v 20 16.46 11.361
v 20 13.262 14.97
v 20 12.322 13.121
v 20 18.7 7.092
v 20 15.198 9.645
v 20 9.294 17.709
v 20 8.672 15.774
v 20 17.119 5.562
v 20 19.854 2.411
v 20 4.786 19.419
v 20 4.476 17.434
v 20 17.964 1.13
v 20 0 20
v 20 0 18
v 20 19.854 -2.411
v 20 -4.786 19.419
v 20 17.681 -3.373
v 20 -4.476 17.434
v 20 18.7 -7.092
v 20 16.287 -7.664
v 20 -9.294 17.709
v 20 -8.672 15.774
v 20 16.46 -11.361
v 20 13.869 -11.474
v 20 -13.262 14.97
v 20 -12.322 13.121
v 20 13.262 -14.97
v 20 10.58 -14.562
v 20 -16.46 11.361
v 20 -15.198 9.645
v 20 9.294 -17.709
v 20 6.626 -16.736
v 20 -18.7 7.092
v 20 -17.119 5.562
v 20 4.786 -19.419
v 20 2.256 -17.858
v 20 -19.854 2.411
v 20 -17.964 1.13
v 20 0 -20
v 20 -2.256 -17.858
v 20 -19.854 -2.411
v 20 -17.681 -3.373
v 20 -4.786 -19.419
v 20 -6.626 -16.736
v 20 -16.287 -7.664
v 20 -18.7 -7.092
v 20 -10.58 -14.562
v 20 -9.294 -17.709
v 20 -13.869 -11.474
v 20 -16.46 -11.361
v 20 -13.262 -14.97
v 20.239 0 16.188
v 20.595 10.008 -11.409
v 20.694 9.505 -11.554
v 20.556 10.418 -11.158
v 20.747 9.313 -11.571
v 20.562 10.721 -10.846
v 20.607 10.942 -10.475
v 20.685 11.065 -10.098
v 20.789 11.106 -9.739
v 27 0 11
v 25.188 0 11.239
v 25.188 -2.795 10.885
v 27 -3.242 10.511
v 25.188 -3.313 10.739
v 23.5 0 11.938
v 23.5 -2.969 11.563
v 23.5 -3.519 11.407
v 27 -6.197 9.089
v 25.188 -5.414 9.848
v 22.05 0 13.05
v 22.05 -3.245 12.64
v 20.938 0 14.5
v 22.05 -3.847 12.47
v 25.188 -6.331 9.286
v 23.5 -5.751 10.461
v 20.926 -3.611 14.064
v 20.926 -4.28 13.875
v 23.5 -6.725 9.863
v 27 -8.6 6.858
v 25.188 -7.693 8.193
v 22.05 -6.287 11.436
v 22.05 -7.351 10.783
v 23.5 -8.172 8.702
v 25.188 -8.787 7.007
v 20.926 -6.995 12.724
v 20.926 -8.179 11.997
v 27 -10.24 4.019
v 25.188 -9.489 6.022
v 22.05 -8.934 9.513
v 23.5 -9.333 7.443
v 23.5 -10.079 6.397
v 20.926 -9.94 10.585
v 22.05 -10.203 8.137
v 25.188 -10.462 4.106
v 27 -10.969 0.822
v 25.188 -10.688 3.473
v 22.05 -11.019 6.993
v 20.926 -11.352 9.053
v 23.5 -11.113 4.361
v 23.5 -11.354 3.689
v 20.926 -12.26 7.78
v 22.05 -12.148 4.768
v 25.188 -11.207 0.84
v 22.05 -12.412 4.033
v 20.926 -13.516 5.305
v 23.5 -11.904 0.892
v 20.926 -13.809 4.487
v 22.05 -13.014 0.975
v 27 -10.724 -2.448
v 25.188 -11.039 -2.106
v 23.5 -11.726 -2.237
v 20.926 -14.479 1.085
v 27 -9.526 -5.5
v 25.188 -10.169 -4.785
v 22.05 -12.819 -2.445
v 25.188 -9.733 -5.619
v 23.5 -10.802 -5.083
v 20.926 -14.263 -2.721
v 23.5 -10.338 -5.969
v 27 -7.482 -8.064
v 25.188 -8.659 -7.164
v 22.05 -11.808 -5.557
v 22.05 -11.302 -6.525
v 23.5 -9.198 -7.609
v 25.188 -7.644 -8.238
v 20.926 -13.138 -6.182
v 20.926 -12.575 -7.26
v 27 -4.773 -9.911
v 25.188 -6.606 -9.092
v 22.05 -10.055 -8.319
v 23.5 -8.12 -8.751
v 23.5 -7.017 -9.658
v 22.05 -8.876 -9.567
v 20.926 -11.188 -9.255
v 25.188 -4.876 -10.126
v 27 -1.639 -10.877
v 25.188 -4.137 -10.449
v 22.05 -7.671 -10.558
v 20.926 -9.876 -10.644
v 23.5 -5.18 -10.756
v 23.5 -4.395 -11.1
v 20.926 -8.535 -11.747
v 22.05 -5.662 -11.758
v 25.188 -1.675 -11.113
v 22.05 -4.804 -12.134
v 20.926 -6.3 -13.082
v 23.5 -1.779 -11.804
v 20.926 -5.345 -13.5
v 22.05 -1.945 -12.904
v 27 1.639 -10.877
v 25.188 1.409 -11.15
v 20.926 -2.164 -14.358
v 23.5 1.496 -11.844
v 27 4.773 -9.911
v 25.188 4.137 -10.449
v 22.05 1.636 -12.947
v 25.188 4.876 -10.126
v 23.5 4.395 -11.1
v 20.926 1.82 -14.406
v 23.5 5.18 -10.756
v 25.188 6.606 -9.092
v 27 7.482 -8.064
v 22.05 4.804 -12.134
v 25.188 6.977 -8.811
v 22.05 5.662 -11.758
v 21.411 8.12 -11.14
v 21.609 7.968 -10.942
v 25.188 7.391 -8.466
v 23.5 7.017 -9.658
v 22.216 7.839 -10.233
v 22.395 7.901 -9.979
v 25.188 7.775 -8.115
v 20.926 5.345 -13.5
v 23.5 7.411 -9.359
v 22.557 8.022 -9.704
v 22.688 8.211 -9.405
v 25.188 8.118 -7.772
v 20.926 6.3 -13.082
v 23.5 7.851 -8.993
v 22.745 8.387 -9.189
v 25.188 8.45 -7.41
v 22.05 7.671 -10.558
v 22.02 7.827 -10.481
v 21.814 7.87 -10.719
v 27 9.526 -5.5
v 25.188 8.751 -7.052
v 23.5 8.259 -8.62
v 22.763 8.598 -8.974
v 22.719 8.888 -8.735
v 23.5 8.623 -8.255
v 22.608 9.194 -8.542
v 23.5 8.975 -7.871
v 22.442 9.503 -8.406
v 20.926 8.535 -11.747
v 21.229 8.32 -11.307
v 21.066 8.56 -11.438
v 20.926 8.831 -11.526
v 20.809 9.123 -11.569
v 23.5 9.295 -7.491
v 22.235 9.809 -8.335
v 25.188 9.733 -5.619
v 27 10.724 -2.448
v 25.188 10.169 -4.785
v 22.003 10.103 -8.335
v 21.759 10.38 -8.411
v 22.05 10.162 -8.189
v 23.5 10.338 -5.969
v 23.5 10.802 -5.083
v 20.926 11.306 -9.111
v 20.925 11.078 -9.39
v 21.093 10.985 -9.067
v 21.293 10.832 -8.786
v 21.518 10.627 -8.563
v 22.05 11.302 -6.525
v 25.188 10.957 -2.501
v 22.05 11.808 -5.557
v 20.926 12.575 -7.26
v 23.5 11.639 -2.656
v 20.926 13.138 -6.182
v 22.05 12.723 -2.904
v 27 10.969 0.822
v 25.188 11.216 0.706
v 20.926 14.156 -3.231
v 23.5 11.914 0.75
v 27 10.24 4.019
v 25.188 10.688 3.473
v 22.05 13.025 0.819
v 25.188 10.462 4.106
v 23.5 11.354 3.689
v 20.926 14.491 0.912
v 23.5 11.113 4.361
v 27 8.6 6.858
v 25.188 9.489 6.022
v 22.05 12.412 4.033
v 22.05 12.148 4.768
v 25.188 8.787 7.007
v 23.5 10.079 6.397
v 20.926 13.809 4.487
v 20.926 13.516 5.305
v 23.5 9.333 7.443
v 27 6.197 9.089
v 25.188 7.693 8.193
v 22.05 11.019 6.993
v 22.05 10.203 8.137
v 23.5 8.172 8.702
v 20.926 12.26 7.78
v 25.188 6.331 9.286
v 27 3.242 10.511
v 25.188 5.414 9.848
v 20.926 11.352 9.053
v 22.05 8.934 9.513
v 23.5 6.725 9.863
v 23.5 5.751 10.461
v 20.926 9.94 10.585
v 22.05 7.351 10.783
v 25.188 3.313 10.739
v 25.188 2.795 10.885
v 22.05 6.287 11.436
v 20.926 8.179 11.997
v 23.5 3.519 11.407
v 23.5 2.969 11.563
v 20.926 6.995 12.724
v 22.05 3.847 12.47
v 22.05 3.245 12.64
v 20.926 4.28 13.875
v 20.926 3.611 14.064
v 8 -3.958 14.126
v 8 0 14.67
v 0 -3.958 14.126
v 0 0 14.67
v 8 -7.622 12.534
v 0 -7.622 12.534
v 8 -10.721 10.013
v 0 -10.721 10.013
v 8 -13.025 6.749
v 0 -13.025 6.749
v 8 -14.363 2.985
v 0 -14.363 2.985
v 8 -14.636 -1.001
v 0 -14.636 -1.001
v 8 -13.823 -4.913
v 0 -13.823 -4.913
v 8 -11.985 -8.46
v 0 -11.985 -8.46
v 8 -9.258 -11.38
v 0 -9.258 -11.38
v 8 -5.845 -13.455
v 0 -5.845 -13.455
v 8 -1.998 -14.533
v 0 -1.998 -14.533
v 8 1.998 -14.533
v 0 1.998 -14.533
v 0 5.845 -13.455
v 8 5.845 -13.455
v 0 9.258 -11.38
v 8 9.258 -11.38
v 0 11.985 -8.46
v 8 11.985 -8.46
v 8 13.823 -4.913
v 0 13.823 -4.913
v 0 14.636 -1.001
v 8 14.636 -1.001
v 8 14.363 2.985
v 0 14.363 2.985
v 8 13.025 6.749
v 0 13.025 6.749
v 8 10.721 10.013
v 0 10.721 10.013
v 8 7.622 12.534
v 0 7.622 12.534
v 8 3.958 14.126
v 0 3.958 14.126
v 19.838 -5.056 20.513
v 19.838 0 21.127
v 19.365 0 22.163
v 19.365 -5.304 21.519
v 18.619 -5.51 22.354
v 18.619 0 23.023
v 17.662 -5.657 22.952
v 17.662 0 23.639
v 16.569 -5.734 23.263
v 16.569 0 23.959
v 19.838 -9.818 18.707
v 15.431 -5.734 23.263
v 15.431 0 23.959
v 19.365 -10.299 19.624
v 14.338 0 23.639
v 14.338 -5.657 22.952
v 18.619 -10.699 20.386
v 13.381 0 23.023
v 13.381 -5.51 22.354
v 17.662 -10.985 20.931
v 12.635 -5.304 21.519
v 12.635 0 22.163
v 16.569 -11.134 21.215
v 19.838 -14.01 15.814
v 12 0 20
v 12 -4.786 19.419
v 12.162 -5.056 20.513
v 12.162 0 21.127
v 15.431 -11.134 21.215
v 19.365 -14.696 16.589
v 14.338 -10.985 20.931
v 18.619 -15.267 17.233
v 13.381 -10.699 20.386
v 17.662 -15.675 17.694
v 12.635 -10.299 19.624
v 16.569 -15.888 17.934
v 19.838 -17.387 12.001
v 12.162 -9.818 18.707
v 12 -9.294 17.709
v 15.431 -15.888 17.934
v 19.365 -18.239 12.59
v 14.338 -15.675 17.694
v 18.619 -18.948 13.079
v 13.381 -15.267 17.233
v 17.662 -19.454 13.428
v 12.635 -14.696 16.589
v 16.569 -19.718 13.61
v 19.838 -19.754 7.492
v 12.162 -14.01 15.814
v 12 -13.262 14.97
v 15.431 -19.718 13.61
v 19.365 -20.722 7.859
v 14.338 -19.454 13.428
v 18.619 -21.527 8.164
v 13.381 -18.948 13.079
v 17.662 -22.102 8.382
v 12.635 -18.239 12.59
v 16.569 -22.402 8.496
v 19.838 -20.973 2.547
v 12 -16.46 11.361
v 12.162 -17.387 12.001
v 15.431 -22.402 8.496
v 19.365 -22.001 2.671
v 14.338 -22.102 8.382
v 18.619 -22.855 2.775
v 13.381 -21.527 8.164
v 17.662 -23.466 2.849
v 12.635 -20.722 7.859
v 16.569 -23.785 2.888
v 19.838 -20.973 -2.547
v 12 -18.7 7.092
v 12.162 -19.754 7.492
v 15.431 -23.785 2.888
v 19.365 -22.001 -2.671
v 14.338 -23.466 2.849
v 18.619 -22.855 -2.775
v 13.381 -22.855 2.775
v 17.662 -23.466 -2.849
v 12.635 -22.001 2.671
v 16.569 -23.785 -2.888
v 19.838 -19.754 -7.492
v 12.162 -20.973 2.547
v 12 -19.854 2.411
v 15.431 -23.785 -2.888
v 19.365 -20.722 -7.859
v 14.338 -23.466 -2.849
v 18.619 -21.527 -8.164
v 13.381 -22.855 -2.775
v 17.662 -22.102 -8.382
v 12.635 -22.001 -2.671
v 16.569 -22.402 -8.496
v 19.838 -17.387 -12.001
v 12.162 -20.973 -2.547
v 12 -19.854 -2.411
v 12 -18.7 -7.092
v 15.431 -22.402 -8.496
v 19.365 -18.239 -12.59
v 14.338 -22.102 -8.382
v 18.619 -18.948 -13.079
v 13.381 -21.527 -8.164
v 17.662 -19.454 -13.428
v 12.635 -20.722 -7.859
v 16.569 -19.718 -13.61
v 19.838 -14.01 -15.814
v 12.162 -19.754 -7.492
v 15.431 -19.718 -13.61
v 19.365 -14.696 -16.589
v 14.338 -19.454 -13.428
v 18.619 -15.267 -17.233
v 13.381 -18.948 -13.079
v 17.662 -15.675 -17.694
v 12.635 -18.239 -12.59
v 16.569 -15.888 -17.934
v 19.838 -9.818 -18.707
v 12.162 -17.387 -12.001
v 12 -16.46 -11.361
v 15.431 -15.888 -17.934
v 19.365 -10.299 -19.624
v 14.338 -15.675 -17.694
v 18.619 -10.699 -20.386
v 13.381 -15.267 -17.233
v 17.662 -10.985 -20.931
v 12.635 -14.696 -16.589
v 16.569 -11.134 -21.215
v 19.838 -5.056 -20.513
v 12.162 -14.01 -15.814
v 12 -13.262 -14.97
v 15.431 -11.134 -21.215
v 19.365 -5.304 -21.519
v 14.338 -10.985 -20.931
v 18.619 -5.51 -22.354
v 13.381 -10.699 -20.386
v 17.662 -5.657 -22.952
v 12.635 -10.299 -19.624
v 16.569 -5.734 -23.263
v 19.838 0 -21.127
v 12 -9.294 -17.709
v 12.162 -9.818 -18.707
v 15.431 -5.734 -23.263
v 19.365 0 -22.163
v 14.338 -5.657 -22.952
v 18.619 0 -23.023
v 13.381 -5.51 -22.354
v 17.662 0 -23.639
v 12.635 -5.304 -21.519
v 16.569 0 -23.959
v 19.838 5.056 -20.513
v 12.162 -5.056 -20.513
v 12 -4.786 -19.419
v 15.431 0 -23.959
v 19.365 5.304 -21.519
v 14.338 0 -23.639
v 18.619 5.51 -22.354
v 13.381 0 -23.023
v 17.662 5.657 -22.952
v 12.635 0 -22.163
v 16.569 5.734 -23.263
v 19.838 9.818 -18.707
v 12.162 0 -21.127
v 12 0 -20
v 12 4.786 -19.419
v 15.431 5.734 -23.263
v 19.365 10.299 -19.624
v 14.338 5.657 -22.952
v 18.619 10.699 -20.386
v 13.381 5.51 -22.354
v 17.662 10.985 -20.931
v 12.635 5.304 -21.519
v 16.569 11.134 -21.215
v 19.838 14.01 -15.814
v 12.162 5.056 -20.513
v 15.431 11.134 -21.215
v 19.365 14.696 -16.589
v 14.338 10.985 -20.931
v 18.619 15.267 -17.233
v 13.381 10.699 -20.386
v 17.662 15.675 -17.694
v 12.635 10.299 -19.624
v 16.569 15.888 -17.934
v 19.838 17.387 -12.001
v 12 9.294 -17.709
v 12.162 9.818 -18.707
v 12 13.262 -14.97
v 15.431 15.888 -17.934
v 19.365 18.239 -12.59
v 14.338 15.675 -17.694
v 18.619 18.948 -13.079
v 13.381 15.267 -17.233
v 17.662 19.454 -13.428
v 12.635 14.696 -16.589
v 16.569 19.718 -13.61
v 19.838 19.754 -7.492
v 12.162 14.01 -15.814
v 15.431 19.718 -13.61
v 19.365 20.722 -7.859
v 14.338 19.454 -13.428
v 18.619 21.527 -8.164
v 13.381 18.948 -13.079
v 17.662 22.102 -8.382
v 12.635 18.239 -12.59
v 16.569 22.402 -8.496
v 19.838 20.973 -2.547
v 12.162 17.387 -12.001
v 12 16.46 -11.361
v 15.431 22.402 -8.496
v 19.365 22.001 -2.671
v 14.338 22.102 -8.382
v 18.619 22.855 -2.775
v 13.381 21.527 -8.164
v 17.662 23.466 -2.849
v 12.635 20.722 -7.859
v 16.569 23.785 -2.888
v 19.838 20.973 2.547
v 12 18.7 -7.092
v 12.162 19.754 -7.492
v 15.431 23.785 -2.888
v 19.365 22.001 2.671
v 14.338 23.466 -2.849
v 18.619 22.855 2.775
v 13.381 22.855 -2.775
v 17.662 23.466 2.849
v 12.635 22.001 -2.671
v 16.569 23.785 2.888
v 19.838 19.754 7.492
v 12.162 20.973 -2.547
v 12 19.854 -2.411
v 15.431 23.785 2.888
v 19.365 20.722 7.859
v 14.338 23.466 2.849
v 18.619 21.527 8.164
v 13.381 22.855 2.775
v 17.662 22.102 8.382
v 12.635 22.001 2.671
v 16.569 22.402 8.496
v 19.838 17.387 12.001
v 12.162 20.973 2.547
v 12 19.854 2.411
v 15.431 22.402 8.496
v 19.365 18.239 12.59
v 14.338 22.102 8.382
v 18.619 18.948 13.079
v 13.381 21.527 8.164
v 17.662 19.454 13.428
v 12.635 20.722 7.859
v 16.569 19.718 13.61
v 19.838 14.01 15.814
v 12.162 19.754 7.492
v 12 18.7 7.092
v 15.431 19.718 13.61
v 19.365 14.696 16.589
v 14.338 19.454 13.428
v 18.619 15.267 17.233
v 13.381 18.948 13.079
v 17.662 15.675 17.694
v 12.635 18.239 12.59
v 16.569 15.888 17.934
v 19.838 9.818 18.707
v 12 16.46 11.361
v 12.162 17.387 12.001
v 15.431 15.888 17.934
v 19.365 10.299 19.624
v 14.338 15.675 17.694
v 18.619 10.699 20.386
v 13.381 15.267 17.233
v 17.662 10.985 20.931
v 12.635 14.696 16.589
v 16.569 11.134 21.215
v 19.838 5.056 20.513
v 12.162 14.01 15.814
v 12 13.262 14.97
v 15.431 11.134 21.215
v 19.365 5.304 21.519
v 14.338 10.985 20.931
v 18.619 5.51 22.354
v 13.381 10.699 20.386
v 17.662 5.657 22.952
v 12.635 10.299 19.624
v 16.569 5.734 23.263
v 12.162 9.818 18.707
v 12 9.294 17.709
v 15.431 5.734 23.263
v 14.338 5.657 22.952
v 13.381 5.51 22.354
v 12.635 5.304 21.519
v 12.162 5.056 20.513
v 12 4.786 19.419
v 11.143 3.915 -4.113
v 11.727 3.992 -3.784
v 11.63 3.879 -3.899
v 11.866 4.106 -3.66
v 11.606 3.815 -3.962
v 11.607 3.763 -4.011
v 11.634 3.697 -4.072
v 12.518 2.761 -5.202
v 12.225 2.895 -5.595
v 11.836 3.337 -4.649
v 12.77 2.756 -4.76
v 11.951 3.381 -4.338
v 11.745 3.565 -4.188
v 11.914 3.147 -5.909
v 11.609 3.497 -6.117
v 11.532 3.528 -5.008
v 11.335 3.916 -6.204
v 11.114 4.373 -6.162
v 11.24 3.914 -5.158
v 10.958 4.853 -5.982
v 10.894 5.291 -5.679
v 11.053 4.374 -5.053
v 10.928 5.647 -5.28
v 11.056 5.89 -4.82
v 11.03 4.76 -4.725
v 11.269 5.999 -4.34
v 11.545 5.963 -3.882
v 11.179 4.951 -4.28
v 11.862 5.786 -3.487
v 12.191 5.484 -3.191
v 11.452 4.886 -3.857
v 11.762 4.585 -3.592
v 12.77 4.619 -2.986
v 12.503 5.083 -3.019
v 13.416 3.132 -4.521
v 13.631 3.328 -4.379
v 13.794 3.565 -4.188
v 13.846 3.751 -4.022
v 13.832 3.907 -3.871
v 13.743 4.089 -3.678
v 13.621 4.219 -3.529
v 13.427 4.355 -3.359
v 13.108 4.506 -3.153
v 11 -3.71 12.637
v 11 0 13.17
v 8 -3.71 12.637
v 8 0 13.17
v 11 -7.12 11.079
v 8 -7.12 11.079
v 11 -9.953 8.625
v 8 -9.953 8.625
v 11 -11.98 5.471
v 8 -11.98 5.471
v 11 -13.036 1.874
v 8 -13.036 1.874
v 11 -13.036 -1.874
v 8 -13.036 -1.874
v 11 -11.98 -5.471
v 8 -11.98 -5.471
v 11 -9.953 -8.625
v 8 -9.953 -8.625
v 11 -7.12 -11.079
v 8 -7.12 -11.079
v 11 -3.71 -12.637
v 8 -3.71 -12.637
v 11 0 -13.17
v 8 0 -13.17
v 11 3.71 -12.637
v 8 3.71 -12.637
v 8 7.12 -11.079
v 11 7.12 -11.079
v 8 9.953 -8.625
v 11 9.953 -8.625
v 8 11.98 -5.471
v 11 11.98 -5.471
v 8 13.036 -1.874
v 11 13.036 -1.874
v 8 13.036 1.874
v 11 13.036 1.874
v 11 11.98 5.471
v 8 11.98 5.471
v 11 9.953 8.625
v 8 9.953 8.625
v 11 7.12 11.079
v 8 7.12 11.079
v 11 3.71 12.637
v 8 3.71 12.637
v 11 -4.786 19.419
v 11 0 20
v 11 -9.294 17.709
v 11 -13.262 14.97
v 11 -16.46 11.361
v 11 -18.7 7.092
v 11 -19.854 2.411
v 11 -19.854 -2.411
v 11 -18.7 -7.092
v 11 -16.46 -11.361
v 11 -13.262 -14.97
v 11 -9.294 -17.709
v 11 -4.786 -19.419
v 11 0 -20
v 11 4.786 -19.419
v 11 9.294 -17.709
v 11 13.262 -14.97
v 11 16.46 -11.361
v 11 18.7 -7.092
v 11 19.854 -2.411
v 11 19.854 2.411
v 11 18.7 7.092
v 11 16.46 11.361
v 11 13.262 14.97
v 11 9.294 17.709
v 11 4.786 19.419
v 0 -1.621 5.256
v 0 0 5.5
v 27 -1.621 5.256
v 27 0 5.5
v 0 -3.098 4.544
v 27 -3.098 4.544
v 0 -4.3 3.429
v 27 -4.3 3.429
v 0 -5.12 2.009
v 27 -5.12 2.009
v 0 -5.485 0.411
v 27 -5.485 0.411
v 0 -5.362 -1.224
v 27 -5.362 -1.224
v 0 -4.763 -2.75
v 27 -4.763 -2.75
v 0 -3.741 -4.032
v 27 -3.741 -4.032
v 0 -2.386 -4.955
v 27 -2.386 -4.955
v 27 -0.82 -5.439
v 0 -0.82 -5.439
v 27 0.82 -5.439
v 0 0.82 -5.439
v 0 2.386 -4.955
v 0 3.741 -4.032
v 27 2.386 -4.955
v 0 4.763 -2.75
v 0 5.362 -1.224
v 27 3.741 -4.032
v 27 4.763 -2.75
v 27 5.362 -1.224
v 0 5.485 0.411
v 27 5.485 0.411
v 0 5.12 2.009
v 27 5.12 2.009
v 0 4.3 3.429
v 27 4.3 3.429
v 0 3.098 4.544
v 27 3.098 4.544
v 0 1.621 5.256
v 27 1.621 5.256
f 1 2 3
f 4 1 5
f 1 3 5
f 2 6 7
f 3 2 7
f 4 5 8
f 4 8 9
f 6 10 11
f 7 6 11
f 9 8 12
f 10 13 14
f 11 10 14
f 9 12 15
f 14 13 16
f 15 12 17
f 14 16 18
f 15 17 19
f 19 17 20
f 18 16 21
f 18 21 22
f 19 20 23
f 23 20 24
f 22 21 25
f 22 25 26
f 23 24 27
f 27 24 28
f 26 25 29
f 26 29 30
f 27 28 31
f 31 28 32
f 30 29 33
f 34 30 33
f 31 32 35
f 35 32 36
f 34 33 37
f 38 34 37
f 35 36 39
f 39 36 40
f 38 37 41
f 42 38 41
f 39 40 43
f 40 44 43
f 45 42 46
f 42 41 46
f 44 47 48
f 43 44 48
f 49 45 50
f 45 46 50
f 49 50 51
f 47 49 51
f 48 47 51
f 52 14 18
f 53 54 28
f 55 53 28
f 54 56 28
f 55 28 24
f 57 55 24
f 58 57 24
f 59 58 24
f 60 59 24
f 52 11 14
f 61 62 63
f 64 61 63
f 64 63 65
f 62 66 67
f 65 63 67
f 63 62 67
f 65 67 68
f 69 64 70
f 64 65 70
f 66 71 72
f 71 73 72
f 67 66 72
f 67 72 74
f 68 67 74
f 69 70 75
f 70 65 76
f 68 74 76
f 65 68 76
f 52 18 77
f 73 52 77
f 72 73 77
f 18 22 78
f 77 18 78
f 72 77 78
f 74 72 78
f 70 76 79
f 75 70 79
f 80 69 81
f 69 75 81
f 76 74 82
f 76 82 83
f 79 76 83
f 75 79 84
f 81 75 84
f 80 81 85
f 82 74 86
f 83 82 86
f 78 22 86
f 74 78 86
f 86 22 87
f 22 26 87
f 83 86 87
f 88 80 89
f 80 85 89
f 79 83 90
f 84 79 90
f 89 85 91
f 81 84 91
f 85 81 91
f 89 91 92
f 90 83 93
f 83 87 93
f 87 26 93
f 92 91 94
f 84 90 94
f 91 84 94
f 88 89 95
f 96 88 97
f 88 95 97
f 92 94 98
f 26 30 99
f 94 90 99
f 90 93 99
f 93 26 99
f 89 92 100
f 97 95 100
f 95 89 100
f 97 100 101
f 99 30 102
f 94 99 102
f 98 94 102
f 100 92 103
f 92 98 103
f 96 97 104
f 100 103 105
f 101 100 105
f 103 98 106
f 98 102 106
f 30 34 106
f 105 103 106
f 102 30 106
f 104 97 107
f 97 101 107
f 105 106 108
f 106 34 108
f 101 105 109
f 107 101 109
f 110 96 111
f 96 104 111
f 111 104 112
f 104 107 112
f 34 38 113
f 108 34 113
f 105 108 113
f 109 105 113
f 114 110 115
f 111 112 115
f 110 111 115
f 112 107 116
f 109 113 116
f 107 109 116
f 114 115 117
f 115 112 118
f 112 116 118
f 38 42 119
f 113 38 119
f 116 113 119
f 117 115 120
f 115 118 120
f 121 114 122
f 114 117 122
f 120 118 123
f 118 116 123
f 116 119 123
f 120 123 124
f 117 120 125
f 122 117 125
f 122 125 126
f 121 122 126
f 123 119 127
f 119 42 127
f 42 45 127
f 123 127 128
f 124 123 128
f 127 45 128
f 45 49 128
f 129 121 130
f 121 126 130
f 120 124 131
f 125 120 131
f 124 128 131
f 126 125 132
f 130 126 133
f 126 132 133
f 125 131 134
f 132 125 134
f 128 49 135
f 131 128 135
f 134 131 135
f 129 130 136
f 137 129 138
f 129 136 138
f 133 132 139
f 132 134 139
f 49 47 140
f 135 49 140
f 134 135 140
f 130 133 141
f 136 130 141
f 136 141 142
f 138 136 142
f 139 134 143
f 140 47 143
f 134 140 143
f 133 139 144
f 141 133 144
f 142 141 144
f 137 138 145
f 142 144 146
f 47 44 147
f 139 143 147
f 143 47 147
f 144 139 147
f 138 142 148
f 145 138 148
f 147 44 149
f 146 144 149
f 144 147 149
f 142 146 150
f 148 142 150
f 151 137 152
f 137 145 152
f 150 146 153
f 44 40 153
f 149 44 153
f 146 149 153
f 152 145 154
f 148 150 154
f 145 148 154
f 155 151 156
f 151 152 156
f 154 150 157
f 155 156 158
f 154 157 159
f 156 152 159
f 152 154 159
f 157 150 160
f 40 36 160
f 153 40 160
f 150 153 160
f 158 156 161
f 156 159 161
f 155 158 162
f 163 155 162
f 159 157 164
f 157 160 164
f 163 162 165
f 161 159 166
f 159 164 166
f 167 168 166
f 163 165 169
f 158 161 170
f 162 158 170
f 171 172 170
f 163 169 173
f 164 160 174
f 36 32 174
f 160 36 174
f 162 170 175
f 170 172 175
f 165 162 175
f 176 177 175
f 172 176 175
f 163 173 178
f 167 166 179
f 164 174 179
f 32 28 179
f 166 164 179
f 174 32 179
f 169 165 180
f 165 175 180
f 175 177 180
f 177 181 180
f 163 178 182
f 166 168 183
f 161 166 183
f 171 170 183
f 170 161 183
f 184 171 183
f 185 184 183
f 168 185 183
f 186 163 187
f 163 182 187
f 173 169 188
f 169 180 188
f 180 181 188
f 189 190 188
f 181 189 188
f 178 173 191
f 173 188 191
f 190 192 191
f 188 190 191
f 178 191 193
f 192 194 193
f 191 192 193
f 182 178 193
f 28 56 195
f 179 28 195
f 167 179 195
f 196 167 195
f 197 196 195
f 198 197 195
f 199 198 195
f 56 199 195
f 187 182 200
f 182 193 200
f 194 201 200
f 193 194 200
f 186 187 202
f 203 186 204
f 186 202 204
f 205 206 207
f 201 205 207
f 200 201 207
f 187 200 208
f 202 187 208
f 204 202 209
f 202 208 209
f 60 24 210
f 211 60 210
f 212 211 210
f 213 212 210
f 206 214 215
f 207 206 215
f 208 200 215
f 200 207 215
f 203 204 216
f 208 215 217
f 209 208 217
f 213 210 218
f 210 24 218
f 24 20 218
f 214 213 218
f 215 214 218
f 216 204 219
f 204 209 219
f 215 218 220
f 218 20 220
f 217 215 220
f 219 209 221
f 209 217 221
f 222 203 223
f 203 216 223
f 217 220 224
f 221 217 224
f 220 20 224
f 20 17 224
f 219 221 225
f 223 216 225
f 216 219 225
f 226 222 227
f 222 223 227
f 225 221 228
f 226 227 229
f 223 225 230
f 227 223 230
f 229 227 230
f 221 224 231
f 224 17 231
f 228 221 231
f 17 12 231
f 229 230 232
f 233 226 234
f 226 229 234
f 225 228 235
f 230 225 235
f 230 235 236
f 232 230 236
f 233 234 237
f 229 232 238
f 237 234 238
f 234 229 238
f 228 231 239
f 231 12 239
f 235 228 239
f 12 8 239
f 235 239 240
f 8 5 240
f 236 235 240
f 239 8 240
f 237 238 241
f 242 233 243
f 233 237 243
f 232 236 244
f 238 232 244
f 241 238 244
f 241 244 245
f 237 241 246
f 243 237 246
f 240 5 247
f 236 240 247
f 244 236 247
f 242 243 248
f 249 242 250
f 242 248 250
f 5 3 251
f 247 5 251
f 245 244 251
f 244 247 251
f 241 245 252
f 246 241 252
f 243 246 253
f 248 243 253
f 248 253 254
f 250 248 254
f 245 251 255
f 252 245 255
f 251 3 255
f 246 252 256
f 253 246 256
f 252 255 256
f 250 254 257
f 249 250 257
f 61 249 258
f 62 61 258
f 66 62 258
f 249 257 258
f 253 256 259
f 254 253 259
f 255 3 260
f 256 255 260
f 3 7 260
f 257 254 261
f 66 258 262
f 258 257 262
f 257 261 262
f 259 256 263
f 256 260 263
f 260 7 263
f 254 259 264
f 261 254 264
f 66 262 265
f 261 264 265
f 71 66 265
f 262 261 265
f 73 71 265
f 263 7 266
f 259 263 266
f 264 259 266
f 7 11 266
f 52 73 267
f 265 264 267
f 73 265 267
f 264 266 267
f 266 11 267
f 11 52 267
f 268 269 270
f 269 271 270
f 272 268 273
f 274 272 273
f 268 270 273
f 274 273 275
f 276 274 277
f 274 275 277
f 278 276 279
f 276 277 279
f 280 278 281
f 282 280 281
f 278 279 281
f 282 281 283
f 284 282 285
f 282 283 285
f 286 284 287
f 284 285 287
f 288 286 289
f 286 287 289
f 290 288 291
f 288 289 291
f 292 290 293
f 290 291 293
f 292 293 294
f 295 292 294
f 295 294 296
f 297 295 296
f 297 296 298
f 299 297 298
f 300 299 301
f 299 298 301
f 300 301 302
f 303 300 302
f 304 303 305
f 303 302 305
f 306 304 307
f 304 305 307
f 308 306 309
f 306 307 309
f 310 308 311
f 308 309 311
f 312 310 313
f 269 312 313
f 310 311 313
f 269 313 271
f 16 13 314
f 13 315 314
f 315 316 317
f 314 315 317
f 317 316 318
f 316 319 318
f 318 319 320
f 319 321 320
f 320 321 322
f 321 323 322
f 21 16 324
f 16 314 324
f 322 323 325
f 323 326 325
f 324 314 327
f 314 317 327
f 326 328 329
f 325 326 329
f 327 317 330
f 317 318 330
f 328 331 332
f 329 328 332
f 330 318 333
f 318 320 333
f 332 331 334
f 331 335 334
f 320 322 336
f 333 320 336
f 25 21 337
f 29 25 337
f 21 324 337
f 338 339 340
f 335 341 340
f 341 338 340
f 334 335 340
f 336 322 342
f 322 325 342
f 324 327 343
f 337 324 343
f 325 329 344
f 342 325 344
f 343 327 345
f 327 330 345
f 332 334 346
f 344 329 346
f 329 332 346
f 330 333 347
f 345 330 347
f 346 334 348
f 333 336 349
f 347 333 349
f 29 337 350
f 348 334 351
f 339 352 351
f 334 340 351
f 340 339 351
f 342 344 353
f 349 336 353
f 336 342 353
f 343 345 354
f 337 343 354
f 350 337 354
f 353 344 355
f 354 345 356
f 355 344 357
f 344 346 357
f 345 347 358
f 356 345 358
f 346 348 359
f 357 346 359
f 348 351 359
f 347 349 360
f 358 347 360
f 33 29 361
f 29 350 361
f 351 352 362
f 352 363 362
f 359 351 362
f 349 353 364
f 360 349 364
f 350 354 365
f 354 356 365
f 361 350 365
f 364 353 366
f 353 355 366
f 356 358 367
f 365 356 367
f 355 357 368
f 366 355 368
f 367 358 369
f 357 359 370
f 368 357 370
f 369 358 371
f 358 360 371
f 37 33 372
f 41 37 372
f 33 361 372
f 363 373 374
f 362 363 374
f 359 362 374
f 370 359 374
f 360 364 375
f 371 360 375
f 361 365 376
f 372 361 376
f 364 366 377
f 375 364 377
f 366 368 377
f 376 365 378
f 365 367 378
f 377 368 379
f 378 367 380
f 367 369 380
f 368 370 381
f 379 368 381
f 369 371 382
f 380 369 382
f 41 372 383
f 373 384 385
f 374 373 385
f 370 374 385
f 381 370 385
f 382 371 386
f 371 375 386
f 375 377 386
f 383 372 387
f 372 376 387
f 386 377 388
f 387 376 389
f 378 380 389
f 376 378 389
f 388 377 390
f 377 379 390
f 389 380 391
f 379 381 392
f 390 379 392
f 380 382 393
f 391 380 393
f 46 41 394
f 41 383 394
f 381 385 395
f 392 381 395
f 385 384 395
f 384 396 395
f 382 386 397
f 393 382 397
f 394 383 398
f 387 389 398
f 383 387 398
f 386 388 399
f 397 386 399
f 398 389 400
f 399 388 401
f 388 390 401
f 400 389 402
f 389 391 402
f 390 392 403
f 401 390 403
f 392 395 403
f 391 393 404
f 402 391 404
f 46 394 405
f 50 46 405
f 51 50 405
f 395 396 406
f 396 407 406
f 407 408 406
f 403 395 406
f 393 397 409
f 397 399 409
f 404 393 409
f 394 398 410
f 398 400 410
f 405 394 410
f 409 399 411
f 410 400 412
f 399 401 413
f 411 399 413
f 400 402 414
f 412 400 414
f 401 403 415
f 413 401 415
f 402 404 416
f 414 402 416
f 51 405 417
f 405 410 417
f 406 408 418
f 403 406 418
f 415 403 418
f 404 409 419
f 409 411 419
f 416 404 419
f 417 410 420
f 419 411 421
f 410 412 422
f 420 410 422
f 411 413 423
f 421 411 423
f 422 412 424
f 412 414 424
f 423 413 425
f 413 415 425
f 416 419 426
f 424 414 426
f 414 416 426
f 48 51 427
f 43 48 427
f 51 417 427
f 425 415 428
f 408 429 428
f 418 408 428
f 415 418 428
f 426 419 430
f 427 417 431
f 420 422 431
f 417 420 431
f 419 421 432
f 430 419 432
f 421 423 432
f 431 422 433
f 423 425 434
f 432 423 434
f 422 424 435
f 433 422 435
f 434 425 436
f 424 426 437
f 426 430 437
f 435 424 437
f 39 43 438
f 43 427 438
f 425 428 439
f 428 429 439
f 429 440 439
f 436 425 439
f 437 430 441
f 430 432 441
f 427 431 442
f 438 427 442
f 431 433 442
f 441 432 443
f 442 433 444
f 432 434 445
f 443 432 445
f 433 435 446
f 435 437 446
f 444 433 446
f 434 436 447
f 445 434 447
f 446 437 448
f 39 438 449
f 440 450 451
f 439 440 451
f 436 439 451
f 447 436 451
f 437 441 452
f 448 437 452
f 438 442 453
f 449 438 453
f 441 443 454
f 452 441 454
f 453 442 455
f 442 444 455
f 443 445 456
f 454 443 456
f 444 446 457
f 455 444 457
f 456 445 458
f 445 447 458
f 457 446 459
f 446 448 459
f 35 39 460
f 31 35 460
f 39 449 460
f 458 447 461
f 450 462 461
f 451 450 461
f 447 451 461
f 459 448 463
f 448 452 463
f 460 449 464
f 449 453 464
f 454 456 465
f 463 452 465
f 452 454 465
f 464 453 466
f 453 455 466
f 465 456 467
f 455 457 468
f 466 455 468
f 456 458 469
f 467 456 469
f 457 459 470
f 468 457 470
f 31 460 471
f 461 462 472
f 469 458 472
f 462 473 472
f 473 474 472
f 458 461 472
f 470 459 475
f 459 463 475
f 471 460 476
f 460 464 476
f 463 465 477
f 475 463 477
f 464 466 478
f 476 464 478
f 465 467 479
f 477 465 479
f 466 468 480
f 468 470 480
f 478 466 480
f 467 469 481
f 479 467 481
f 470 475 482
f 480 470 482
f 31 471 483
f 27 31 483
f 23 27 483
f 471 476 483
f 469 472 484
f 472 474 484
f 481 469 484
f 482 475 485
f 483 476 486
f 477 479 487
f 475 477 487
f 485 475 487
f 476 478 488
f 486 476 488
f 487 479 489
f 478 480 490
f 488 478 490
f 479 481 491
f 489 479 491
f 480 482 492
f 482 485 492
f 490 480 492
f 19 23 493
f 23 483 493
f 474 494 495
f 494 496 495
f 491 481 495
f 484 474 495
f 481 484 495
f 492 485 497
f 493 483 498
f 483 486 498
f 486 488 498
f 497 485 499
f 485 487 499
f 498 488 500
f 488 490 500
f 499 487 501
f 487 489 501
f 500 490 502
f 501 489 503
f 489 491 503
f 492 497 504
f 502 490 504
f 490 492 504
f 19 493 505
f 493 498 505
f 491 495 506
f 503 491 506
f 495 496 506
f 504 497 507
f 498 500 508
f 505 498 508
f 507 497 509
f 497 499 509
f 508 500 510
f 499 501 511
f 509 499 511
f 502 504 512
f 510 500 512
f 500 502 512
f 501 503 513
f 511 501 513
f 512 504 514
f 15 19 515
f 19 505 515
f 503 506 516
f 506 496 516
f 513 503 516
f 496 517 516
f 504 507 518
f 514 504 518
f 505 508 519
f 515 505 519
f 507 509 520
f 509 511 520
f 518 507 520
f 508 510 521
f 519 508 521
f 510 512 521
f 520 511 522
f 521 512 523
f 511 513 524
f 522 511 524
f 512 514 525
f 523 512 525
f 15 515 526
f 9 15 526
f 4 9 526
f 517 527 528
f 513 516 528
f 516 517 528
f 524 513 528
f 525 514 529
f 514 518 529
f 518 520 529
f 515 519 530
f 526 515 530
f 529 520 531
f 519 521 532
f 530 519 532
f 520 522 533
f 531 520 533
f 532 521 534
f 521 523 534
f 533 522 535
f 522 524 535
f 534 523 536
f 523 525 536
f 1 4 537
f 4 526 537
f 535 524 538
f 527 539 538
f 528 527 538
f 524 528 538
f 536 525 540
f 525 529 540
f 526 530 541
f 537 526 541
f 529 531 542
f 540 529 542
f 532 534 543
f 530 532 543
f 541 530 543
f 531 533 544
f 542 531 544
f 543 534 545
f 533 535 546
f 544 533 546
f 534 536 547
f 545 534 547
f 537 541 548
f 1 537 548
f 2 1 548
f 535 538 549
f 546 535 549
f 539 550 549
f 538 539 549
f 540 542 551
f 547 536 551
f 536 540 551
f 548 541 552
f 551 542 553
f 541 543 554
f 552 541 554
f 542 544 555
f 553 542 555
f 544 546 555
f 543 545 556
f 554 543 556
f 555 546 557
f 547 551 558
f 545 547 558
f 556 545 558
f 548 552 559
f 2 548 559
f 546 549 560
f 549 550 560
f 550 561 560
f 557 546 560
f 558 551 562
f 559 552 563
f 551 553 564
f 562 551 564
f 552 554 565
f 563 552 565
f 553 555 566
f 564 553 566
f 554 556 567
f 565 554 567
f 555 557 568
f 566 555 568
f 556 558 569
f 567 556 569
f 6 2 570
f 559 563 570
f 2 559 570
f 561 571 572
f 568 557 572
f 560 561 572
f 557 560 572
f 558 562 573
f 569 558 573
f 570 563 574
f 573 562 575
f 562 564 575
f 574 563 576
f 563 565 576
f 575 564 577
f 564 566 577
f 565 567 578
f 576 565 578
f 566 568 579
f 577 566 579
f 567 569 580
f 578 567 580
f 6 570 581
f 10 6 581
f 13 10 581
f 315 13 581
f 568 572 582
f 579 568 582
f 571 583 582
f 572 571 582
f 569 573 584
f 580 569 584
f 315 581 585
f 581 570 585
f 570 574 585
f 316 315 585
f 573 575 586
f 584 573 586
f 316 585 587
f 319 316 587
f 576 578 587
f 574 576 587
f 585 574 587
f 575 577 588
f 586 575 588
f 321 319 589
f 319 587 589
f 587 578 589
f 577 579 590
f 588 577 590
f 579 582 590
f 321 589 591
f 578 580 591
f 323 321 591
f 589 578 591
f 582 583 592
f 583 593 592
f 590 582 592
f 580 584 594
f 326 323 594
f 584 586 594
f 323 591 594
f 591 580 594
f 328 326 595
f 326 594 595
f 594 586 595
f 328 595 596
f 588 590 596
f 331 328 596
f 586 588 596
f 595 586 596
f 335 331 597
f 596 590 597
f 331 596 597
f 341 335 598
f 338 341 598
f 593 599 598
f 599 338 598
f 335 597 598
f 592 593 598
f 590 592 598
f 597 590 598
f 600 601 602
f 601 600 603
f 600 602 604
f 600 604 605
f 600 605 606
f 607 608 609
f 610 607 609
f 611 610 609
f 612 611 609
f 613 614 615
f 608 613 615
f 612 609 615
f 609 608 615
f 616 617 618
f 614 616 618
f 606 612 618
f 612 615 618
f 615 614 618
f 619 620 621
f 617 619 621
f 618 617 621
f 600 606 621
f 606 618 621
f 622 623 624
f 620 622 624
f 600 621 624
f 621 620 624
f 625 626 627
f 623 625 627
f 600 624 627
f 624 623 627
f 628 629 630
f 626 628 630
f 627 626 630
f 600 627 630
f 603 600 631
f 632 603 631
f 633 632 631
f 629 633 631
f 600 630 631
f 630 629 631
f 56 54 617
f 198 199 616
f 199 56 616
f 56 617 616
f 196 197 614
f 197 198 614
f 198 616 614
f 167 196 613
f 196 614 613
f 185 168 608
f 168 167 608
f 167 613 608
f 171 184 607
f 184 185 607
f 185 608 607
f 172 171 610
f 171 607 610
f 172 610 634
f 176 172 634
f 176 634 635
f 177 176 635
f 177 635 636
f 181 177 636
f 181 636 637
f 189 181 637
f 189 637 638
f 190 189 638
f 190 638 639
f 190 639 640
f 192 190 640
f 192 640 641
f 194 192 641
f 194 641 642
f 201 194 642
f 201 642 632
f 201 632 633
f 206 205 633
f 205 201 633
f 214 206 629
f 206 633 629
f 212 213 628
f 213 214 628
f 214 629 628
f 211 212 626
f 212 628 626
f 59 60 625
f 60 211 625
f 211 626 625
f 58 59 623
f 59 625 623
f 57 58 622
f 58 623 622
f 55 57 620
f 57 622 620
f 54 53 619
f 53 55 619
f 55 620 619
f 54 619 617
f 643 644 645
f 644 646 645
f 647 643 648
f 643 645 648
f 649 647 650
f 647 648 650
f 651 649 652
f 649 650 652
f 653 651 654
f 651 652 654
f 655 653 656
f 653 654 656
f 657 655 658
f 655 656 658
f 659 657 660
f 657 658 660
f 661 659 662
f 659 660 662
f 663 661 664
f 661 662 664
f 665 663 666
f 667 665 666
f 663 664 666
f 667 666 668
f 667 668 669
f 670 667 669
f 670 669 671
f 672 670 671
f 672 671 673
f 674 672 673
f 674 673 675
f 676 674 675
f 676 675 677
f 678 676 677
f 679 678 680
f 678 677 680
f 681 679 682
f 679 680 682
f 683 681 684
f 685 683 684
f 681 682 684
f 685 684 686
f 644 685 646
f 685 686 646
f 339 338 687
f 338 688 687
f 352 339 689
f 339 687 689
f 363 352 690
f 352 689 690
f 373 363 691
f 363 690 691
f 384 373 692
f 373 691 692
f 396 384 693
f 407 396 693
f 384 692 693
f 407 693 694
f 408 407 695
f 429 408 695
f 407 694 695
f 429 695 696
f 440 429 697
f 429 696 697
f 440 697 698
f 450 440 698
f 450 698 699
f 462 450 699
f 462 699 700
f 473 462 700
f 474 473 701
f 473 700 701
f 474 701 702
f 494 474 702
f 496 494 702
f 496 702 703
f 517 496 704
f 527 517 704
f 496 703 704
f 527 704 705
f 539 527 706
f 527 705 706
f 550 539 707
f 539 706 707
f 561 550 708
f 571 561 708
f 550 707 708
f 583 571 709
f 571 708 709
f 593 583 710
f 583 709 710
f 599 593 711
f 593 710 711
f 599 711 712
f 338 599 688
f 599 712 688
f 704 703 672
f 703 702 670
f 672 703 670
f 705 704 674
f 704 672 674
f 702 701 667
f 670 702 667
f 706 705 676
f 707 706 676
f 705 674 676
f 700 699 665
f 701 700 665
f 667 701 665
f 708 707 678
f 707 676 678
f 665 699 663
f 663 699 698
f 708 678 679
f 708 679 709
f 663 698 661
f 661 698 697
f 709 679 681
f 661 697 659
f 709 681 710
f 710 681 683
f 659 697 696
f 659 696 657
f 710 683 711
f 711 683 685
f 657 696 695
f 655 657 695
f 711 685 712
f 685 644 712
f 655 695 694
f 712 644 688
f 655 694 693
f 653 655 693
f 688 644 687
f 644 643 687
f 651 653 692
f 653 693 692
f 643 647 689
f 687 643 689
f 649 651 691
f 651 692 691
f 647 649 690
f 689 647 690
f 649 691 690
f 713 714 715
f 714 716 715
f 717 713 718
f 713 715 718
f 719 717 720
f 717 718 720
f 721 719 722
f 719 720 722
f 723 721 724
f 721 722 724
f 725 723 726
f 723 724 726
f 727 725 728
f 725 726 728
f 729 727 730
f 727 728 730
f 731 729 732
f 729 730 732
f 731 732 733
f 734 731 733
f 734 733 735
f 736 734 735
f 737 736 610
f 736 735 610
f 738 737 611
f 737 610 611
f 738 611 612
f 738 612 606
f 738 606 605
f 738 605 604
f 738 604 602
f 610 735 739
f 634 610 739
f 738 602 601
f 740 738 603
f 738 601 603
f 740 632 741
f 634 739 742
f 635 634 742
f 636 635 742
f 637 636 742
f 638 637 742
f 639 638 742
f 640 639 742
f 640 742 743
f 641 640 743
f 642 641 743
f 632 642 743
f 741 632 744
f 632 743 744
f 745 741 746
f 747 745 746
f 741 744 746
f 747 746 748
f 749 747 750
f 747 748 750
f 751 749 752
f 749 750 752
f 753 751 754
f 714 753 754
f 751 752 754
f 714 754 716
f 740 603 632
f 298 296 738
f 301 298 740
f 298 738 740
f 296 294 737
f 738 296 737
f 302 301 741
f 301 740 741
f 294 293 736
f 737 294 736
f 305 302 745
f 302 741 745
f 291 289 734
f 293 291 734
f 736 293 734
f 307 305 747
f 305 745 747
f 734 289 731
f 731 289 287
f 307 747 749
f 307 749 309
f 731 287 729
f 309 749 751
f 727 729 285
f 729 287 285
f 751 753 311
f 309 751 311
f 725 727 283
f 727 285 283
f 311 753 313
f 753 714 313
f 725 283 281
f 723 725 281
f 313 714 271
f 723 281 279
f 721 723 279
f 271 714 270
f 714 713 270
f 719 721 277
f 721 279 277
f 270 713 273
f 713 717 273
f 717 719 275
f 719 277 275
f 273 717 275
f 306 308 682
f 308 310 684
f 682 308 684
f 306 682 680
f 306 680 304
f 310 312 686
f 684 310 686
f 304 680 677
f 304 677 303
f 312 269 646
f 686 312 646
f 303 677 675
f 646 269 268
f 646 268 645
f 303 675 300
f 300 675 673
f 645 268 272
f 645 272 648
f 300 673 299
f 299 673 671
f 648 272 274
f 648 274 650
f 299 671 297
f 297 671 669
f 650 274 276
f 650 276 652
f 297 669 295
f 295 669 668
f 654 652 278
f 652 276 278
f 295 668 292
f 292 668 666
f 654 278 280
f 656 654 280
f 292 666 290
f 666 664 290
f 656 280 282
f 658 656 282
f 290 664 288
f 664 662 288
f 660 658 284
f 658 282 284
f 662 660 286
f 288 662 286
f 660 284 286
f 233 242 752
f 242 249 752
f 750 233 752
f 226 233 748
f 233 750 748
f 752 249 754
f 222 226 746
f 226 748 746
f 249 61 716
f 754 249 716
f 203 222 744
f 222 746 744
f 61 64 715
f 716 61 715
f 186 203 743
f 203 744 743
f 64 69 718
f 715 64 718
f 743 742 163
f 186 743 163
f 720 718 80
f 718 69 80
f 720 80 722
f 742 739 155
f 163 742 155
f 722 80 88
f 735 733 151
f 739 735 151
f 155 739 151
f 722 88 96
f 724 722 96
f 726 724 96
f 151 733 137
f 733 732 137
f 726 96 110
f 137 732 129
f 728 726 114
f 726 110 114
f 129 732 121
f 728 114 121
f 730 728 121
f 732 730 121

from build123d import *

# Parameters (mm, degrees)
F_3_6_3_6_DIAMETER_HOLE1_D     = 3.6
F_3_6_3_6_DIAMETER_HOLE1_DEPTH = 12
F_3_6_3_6_DIAMETER_HOLE1_TIP   = 1.081549114


with BuildPart() as part:
    # Sketch1 → Revolve1 (revolve)
    with BuildSketch(Plane.XY, mode=Mode.PRIVATE) as revolve1_sk:
        with BuildLine():
            Line((0, 14.67), (0, 5.5))
            Line((0, 5.5), (27, 5.5))
            Line((27, 5.5), (27, 11))
            ThreePointArc((27, 11), (22.050252532, 13.050252532), (20, 18))
            Line((20, 18), (20, 20))
            ThreePointArc((20, 20), (16, 24), (12, 20))
            Line((12, 20), (11, 20))
            Line((11, 20), (11, 13.17))
            Line((11, 13.17), (8, 13.17))
            Line((8, 13.17), (8, 14.67))
            Line((8, 14.67), (0, 14.67))
        make_face()
    revolve(revolve1_sk.sketch.rotate(Axis((0, 0, 0), (1, 0, 0)), 90), axis=Axis((0, 0, 0), (1, 0, 0)))

    # Ø3.6 (3.6) Diameter Hole1
    with Locations(Plane(origin=(21.47261693, 9.449479998, -9.92628458), x_dir=(0.49047083458, 0, 0.871457606787), z_dir=(0.789626152924, 0.423067471154, -0.444414731382))):
        with Locations((0, 0)):
            Hole(F_3_6_3_6_DIAMETER_HOLE1_D / 2, depth=F_3_6_3_6_DIAMETER_HOLE1_DEPTH)
            with Locations((0, 0, -(F_3_6_3_6_DIAMETER_HOLE1_DEPTH + F_3_6_3_6_DIAMETER_HOLE1_TIP / 2))):  # 118° drill point
                Cone(0, F_3_6_3_6_DIAMETER_HOLE1_D / 2, F_3_6_3_6_DIAMETER_HOLE1_TIP, mode=Mode.SUBTRACT)


solid = part.part
